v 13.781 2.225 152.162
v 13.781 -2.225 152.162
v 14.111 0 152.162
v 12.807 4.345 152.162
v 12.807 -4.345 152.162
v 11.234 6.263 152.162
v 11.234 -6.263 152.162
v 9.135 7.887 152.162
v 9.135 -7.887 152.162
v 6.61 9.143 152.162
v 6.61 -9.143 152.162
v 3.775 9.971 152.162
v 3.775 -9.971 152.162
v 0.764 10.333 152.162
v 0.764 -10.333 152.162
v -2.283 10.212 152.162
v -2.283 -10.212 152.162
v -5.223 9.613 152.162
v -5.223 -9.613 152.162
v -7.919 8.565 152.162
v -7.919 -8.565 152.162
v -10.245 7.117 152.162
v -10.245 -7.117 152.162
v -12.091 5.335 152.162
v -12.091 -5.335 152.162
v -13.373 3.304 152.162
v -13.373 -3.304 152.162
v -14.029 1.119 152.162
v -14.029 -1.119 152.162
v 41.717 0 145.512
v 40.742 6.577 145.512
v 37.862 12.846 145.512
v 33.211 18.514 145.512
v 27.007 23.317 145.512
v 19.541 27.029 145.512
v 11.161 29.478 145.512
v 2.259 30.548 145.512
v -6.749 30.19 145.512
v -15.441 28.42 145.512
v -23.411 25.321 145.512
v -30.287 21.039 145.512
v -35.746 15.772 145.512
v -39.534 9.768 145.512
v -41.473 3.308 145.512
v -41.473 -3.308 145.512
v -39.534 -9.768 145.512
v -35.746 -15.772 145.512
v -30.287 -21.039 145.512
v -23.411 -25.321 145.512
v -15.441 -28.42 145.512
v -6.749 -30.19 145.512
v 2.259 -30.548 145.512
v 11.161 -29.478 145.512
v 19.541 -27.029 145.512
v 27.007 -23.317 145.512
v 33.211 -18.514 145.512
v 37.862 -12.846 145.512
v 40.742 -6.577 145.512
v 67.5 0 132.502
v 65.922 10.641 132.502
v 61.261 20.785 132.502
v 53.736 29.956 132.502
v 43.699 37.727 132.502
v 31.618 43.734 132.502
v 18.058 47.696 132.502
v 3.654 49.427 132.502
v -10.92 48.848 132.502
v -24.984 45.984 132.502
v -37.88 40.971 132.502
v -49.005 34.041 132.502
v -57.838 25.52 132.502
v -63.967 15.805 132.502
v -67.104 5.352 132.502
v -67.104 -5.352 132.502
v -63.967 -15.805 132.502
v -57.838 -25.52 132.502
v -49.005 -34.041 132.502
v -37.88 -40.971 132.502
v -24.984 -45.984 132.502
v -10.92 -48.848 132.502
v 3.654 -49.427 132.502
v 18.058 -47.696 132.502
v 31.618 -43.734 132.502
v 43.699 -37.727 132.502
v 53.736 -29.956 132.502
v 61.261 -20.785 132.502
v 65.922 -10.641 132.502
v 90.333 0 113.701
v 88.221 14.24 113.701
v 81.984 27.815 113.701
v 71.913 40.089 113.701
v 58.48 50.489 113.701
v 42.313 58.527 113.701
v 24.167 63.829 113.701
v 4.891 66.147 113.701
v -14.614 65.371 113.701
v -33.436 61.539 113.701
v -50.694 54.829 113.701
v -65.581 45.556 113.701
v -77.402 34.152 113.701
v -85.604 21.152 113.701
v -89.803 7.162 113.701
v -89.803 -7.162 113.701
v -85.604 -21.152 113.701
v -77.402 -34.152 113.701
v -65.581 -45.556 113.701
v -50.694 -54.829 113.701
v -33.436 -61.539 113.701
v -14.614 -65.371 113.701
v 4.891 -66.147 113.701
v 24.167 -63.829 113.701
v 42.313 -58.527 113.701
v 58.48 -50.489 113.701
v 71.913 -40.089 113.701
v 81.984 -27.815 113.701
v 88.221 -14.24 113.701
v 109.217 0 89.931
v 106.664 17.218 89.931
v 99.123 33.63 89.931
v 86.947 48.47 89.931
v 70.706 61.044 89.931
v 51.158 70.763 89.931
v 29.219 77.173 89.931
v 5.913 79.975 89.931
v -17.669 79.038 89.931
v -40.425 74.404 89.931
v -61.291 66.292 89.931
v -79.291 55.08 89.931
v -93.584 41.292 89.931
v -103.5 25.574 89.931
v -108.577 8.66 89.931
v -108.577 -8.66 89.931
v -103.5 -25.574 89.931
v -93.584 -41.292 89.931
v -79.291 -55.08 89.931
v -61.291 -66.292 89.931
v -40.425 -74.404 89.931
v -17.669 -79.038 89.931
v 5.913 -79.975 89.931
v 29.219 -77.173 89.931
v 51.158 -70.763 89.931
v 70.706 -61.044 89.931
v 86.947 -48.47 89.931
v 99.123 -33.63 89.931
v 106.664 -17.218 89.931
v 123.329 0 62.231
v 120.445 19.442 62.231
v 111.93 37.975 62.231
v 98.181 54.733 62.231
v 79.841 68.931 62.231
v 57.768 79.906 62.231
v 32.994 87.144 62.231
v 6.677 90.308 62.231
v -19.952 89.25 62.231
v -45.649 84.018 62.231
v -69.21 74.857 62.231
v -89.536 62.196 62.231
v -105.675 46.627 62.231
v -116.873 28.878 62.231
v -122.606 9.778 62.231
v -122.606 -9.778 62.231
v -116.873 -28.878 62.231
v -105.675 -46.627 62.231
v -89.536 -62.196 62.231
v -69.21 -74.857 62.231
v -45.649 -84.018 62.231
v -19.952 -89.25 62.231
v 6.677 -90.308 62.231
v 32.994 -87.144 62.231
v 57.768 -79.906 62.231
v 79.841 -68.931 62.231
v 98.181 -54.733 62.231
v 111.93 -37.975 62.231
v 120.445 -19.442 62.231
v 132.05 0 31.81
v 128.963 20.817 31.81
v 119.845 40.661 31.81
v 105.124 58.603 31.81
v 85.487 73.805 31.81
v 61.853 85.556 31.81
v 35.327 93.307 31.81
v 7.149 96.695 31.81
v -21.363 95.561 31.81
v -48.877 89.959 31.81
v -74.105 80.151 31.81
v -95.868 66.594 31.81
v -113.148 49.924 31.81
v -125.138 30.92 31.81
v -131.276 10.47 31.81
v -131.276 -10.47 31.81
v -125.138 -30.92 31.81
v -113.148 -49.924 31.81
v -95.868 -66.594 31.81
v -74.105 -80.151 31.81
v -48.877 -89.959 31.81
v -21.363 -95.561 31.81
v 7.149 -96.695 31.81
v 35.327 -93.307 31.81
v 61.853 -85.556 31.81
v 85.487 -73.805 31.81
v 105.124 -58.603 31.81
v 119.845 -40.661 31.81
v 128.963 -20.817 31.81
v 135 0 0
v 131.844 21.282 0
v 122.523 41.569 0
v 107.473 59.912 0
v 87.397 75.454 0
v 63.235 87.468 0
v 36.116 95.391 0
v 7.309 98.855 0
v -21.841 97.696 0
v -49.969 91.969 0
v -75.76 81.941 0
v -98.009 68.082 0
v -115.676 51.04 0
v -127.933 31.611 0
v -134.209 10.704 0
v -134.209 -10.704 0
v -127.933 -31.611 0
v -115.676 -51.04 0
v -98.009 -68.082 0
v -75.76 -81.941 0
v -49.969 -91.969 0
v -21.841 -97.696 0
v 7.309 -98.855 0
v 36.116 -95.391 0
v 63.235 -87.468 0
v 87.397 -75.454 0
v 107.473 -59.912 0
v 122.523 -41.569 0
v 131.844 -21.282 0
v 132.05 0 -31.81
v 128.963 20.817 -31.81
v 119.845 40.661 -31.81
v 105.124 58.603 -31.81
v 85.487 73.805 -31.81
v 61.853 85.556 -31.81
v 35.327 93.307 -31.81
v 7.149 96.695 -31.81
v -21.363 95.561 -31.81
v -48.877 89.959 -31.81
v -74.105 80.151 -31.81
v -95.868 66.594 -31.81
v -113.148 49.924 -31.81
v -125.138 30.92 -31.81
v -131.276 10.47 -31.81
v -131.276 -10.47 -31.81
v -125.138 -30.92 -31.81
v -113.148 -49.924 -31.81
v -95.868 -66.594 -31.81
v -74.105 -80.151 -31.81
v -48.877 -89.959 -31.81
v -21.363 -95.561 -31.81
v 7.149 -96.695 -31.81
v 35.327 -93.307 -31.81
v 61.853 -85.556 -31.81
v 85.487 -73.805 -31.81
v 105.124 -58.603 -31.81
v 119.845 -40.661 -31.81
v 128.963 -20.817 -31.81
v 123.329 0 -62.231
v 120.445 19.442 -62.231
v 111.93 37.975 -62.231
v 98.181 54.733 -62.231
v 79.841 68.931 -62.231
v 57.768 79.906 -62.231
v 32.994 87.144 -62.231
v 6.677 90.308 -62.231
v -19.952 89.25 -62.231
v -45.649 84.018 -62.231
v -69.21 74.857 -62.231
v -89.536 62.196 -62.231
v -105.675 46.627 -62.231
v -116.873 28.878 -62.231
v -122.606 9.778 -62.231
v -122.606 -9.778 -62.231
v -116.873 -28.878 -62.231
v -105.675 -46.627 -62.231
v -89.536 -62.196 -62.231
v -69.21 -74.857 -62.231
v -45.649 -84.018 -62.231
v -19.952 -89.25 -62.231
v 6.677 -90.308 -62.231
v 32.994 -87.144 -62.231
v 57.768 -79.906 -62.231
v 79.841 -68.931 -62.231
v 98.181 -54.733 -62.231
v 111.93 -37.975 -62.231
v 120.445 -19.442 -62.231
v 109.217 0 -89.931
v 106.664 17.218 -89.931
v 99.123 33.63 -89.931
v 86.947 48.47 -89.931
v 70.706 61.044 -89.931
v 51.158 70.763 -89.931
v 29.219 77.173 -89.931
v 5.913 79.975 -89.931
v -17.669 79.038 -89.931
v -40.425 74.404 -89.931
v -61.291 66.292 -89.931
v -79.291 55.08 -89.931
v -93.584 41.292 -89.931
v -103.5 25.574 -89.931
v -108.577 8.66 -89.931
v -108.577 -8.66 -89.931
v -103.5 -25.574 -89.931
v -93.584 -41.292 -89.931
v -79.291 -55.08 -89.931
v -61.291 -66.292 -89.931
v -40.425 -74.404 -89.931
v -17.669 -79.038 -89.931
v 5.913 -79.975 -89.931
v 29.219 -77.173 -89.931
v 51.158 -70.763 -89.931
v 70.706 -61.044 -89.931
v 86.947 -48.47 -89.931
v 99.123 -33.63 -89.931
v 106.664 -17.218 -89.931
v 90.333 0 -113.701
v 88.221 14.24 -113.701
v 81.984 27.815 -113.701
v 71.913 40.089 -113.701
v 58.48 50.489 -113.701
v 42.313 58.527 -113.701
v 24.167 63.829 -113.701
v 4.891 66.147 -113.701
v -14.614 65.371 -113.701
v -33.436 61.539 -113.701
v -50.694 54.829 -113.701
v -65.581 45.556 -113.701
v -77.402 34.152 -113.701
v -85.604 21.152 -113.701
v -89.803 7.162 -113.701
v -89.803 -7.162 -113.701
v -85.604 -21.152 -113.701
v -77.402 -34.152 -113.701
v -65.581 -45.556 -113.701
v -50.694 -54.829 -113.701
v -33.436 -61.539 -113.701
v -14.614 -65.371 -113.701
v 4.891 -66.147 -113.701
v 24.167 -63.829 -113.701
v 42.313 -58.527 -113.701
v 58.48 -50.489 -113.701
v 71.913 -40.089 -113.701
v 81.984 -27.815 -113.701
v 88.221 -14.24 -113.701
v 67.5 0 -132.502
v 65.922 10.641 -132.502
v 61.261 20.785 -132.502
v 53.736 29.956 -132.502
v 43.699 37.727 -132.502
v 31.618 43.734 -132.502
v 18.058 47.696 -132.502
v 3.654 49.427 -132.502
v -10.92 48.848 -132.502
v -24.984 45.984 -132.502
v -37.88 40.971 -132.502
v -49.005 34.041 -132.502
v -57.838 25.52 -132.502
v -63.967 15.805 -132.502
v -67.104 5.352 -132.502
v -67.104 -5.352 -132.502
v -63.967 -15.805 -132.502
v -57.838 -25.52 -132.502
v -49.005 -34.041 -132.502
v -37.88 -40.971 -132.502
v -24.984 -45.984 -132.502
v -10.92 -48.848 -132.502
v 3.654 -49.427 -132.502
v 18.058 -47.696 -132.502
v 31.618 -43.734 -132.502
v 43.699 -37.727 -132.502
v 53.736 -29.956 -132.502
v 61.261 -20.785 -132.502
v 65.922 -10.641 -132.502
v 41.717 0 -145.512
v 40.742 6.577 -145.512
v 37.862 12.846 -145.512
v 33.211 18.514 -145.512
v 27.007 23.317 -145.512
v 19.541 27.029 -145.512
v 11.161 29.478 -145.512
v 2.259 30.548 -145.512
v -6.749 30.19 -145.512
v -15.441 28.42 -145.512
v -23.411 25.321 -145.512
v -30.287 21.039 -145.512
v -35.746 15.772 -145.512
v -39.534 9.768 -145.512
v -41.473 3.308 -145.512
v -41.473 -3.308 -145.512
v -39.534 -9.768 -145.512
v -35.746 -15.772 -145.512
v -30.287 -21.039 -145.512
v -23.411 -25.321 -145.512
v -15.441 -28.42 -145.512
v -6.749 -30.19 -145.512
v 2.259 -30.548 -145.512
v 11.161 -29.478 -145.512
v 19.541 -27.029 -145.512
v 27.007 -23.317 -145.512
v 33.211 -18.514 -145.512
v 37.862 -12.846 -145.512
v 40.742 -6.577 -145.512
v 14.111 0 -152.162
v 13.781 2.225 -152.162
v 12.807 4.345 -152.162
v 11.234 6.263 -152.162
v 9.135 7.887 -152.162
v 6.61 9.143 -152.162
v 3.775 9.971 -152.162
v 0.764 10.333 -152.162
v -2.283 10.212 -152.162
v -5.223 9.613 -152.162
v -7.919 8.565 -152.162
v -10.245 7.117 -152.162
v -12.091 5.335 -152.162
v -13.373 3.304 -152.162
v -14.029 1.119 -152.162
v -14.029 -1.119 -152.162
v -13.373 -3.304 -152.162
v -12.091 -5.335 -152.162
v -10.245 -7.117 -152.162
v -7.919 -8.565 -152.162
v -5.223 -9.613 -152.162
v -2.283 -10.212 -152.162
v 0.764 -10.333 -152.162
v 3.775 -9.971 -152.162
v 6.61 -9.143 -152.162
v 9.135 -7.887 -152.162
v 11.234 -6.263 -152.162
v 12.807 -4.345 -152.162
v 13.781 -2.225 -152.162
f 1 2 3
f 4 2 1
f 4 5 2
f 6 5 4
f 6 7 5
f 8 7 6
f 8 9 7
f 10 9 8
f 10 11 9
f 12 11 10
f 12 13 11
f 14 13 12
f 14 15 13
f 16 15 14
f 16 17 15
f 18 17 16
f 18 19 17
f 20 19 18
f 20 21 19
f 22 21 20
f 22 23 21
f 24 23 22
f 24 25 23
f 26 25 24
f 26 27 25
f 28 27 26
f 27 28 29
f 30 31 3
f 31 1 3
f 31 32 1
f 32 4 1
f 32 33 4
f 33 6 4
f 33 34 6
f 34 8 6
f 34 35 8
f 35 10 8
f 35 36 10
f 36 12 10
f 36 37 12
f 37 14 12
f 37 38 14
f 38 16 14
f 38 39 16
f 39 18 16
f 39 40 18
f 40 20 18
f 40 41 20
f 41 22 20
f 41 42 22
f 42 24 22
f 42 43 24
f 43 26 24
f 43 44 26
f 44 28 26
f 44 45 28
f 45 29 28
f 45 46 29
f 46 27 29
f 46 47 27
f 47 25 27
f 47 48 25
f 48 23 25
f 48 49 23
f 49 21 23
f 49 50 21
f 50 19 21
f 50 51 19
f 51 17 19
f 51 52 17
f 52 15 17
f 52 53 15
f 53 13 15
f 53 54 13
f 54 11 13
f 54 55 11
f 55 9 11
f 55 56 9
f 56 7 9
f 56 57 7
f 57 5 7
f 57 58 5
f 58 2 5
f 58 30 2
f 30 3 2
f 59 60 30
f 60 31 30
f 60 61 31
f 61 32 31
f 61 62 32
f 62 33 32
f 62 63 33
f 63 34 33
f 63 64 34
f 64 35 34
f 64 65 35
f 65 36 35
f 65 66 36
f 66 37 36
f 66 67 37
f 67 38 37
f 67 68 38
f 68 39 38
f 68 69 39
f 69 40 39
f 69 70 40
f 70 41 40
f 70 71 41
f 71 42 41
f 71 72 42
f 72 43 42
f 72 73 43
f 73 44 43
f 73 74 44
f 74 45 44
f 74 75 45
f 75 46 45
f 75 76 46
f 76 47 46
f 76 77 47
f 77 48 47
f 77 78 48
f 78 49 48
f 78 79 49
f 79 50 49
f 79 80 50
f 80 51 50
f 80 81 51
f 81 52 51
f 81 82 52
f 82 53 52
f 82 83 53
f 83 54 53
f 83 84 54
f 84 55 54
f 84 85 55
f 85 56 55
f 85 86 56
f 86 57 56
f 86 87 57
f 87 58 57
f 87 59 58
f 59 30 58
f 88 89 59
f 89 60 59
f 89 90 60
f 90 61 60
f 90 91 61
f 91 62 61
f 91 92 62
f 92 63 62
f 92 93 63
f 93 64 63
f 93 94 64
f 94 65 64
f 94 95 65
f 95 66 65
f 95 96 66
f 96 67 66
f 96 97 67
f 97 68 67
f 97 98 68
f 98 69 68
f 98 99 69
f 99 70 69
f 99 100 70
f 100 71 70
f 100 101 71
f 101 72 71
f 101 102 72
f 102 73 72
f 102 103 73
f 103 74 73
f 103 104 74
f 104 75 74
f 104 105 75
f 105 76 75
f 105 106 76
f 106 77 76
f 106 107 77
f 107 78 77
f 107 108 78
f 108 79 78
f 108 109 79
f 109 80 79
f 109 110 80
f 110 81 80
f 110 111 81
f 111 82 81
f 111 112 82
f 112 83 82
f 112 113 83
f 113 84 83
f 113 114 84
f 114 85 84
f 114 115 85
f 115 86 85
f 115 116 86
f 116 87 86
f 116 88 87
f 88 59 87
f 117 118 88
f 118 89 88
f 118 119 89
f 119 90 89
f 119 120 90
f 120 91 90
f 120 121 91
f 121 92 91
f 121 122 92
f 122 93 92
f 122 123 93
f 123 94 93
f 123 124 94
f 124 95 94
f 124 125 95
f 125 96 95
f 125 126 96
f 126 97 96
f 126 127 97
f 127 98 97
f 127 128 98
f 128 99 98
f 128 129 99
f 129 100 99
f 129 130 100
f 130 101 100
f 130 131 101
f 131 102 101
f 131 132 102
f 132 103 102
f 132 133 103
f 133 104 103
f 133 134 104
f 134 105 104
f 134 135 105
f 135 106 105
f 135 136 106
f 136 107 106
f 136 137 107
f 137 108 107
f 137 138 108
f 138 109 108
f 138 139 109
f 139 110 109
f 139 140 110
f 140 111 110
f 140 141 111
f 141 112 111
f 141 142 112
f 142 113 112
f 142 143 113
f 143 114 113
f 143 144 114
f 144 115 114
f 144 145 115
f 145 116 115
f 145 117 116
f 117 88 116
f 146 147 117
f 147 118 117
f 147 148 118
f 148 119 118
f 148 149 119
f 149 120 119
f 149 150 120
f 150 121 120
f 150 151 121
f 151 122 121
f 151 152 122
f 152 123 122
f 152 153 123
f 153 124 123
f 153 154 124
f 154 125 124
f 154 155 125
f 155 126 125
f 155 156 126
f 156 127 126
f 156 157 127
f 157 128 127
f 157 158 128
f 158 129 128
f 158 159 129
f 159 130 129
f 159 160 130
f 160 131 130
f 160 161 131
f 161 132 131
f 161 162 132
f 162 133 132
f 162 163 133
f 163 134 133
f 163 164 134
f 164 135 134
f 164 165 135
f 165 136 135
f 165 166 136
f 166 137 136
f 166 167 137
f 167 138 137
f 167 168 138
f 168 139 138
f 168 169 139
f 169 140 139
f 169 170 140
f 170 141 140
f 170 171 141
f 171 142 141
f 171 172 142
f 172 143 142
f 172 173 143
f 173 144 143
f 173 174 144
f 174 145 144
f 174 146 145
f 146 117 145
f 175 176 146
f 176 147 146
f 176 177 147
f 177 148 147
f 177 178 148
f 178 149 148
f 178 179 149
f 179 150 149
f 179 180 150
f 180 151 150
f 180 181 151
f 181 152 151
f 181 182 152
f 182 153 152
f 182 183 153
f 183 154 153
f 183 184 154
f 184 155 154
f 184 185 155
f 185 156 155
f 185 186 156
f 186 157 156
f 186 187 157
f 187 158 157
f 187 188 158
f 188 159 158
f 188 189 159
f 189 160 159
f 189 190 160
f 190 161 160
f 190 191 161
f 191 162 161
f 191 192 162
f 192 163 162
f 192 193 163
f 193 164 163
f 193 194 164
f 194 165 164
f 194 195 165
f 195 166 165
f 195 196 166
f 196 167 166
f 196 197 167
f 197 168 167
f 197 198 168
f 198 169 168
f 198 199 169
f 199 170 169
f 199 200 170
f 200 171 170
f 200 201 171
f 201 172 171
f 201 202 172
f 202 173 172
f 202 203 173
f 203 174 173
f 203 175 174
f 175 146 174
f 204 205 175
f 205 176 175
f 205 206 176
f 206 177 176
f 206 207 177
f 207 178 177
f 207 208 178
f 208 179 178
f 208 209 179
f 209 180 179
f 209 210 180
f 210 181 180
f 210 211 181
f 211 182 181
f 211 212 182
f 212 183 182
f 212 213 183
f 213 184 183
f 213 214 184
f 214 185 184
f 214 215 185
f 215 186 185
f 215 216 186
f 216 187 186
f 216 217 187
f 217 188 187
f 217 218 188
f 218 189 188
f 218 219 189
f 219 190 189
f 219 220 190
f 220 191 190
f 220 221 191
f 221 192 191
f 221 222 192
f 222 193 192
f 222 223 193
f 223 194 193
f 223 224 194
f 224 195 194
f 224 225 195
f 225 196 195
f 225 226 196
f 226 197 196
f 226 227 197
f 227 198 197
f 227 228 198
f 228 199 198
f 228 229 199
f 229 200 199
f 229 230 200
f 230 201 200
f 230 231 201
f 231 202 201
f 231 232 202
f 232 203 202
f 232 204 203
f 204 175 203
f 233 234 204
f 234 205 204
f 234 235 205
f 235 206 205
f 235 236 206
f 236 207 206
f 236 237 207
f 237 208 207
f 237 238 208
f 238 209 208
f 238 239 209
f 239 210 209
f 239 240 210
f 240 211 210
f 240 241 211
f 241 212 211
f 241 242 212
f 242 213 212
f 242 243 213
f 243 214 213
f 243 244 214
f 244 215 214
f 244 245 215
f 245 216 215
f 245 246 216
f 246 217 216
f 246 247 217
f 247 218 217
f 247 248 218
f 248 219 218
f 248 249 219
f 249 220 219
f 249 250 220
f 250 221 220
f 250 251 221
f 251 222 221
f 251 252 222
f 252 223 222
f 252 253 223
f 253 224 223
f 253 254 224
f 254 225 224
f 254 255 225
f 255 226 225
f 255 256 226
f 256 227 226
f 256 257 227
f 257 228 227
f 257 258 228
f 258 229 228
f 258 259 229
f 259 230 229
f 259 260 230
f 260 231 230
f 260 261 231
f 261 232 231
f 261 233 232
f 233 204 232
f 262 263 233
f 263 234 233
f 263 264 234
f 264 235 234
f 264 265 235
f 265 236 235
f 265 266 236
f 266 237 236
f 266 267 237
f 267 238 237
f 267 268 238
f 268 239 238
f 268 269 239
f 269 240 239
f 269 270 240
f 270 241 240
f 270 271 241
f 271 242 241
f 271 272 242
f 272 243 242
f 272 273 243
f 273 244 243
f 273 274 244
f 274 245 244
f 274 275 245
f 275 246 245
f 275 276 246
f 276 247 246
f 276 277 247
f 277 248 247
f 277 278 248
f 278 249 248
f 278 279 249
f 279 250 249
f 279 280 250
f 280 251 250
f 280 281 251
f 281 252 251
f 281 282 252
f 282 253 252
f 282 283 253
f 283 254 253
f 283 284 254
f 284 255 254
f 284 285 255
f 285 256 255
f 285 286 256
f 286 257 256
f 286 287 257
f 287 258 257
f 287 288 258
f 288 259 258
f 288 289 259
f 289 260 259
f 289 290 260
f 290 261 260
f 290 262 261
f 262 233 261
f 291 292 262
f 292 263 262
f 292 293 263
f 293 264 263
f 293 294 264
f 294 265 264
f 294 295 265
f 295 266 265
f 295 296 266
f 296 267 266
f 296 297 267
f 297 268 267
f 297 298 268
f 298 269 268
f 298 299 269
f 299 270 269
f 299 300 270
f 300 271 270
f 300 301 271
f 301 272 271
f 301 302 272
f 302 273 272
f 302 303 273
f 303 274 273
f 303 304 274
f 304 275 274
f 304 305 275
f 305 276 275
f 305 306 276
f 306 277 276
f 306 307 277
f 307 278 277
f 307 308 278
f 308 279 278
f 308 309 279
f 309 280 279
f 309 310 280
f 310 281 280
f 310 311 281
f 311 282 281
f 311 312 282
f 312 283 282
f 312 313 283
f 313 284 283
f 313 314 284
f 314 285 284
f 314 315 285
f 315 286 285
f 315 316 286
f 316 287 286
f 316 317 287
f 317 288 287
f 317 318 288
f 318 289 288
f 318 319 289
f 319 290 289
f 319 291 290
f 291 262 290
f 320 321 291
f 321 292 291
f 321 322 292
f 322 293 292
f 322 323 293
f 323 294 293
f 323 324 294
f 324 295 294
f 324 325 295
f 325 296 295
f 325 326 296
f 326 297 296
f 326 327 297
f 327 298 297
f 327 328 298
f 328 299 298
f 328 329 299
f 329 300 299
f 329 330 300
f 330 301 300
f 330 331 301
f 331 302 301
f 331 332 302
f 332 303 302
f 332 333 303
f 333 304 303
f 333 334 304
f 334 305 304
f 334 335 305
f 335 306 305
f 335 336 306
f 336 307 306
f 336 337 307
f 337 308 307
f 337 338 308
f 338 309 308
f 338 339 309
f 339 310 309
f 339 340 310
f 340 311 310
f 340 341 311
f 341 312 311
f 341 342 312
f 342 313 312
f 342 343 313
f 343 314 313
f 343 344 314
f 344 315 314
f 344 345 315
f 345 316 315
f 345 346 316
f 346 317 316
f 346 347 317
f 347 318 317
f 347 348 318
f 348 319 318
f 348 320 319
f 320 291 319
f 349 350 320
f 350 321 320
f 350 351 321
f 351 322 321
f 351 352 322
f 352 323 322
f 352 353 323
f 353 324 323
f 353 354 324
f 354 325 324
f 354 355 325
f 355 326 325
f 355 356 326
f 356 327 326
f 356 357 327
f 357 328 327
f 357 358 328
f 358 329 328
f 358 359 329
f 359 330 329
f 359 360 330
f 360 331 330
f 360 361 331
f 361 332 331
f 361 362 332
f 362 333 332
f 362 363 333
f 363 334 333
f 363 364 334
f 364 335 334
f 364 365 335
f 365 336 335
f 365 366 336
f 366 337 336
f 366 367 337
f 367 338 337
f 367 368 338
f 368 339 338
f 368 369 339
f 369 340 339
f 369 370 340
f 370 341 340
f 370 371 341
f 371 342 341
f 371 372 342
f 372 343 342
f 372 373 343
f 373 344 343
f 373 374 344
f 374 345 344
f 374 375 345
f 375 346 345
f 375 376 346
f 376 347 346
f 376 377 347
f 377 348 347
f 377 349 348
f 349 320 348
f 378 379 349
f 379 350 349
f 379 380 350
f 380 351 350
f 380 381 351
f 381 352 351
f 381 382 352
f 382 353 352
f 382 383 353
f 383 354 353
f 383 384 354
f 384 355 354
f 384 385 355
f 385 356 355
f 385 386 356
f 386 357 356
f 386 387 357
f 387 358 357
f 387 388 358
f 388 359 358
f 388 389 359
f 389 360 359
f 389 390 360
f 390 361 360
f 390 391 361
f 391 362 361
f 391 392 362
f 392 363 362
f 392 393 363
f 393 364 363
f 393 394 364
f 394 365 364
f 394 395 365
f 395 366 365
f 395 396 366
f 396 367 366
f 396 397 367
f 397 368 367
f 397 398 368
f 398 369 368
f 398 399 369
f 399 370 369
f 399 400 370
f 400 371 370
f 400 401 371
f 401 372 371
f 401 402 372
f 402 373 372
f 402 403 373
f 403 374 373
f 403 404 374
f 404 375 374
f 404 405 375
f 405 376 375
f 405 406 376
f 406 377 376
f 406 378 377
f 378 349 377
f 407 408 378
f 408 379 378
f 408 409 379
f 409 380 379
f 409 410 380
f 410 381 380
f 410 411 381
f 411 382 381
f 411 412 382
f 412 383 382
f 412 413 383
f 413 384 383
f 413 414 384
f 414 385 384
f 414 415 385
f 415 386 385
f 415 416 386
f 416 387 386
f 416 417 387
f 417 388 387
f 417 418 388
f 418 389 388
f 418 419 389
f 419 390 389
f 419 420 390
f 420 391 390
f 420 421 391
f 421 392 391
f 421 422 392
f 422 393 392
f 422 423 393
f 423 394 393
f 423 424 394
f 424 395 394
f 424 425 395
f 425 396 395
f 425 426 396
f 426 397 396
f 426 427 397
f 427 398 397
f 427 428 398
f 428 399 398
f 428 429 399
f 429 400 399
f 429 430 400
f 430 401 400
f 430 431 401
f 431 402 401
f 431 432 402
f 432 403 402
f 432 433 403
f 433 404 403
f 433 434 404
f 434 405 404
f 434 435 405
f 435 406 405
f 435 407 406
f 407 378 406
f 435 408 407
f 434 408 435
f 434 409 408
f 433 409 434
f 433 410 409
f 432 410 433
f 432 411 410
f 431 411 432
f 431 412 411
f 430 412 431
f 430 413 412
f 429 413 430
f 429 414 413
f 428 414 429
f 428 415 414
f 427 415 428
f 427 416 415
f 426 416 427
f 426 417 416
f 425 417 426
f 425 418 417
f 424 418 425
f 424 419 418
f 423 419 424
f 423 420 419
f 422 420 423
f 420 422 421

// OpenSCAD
// Generated by SolidPython 1.0.1 on 2020-07-29 00:46:52


scale(v = [15, 11, 17]) {
	sphere(r = 9);
}
/***********************************************
*********      SolidPython code:      **********
************************************************
 
# import packages: SolidPython
from solid import *
from solid.utils import *
from itertools import chain, combinations, permutations


class Resize:

    def __init__(self, scad_file):
        self.scad_file = scad_file
        #self.scad_file = import_scad(scad_file)
        # cone/cylinder param:
        self.r1 = 0
        self.r2 = 0
        self.h = 0
        # rectangular prism param:
        self.w = 0
        self.l = 0
        # ellipse param:
        self.r = 0

    # import OpenScad code (file name corresponds to shape)


    # classify shape + parameters
    def assign(self, param1, param2, param3):
        if self.scad_file == 'cone.scad':
            self.r1 = param1
            self.r2 = param2
            self.h = param3
        elif self.scad_file == 'cylinder.scad':
            self.r1 = param1
            self.r2 = param2
            self.h = param3
        elif self.scad_file == 'rectangularPrism.scad':
            self.h = param1
            self.l = param2
            self.w = param3
        else:
            self.r = param1
            self.h = param2

    # resize parameters
    def iterate(self):
        x = range(3, 20, 2)
        i = 1
        if self.scad_file == 'cone.scad':
            tempList = list(permutations(x, 2))
            for temp in tempList:
                param1 = temp[0]
                param2 = temp[1]
                filepath = 'produced_scad_files/' + 'cone' + str(param1) + '_' + str(param2) + '_' + '.scad'
                scad_render_to_file(cylinder(h=param1, r1=param2, r2=0), filepath)

        elif self.scad_file == 'cylinder.scad':
            tempList = list(permutations(x, 3))
            for temp in tempList:
                param1 = temp[0]
                param2 = temp[1]
                filepath = 'produced_scad_files/' + 'cylinder' + str(param1) + '_' + str(param2) + '_' + '.scad'
                scad_render_to_file(cylinder(h=param1, r1=param2, r2=param2), filepath)

        elif self.scad_file == 'rectangularPrism.scad':
            tempList = list(permutations(x, 3))
            for temp in tempList:
                param1 = temp[0]
                param2 = temp[1]
                param3 = temp[2]
                filepath = 'produced_scad_files/' + 'rectangularPrism' + str(param1) + '_' + str(param2) + '_' + str(
                    param3) + '.scad'
                scad_render_to_file(cube(size=(param1, param2, param3)), filepath)

        elif self.scad_file == 'ellipse.scad':
            tempList = list(permutations(x, 4))
            for temp in tempList:
                param1 = temp[0]
                param2 = temp[1]
                param3 = temp[2]
                param4 = temp[3]
                filepath = 'produced_scad_files/' + 'ellipse' + str(param1) + '_' + str(param2) + '_' + str(param3) + '_' + str(param4) + '.scad'
                scad_render_to_file(scale([param1, param2, param3])(sphere(r=param4)), filepath)

    def render_to_scadfile(self):
        scad_render_to_file(scad, 'example.scad') 
 
************************************************/
